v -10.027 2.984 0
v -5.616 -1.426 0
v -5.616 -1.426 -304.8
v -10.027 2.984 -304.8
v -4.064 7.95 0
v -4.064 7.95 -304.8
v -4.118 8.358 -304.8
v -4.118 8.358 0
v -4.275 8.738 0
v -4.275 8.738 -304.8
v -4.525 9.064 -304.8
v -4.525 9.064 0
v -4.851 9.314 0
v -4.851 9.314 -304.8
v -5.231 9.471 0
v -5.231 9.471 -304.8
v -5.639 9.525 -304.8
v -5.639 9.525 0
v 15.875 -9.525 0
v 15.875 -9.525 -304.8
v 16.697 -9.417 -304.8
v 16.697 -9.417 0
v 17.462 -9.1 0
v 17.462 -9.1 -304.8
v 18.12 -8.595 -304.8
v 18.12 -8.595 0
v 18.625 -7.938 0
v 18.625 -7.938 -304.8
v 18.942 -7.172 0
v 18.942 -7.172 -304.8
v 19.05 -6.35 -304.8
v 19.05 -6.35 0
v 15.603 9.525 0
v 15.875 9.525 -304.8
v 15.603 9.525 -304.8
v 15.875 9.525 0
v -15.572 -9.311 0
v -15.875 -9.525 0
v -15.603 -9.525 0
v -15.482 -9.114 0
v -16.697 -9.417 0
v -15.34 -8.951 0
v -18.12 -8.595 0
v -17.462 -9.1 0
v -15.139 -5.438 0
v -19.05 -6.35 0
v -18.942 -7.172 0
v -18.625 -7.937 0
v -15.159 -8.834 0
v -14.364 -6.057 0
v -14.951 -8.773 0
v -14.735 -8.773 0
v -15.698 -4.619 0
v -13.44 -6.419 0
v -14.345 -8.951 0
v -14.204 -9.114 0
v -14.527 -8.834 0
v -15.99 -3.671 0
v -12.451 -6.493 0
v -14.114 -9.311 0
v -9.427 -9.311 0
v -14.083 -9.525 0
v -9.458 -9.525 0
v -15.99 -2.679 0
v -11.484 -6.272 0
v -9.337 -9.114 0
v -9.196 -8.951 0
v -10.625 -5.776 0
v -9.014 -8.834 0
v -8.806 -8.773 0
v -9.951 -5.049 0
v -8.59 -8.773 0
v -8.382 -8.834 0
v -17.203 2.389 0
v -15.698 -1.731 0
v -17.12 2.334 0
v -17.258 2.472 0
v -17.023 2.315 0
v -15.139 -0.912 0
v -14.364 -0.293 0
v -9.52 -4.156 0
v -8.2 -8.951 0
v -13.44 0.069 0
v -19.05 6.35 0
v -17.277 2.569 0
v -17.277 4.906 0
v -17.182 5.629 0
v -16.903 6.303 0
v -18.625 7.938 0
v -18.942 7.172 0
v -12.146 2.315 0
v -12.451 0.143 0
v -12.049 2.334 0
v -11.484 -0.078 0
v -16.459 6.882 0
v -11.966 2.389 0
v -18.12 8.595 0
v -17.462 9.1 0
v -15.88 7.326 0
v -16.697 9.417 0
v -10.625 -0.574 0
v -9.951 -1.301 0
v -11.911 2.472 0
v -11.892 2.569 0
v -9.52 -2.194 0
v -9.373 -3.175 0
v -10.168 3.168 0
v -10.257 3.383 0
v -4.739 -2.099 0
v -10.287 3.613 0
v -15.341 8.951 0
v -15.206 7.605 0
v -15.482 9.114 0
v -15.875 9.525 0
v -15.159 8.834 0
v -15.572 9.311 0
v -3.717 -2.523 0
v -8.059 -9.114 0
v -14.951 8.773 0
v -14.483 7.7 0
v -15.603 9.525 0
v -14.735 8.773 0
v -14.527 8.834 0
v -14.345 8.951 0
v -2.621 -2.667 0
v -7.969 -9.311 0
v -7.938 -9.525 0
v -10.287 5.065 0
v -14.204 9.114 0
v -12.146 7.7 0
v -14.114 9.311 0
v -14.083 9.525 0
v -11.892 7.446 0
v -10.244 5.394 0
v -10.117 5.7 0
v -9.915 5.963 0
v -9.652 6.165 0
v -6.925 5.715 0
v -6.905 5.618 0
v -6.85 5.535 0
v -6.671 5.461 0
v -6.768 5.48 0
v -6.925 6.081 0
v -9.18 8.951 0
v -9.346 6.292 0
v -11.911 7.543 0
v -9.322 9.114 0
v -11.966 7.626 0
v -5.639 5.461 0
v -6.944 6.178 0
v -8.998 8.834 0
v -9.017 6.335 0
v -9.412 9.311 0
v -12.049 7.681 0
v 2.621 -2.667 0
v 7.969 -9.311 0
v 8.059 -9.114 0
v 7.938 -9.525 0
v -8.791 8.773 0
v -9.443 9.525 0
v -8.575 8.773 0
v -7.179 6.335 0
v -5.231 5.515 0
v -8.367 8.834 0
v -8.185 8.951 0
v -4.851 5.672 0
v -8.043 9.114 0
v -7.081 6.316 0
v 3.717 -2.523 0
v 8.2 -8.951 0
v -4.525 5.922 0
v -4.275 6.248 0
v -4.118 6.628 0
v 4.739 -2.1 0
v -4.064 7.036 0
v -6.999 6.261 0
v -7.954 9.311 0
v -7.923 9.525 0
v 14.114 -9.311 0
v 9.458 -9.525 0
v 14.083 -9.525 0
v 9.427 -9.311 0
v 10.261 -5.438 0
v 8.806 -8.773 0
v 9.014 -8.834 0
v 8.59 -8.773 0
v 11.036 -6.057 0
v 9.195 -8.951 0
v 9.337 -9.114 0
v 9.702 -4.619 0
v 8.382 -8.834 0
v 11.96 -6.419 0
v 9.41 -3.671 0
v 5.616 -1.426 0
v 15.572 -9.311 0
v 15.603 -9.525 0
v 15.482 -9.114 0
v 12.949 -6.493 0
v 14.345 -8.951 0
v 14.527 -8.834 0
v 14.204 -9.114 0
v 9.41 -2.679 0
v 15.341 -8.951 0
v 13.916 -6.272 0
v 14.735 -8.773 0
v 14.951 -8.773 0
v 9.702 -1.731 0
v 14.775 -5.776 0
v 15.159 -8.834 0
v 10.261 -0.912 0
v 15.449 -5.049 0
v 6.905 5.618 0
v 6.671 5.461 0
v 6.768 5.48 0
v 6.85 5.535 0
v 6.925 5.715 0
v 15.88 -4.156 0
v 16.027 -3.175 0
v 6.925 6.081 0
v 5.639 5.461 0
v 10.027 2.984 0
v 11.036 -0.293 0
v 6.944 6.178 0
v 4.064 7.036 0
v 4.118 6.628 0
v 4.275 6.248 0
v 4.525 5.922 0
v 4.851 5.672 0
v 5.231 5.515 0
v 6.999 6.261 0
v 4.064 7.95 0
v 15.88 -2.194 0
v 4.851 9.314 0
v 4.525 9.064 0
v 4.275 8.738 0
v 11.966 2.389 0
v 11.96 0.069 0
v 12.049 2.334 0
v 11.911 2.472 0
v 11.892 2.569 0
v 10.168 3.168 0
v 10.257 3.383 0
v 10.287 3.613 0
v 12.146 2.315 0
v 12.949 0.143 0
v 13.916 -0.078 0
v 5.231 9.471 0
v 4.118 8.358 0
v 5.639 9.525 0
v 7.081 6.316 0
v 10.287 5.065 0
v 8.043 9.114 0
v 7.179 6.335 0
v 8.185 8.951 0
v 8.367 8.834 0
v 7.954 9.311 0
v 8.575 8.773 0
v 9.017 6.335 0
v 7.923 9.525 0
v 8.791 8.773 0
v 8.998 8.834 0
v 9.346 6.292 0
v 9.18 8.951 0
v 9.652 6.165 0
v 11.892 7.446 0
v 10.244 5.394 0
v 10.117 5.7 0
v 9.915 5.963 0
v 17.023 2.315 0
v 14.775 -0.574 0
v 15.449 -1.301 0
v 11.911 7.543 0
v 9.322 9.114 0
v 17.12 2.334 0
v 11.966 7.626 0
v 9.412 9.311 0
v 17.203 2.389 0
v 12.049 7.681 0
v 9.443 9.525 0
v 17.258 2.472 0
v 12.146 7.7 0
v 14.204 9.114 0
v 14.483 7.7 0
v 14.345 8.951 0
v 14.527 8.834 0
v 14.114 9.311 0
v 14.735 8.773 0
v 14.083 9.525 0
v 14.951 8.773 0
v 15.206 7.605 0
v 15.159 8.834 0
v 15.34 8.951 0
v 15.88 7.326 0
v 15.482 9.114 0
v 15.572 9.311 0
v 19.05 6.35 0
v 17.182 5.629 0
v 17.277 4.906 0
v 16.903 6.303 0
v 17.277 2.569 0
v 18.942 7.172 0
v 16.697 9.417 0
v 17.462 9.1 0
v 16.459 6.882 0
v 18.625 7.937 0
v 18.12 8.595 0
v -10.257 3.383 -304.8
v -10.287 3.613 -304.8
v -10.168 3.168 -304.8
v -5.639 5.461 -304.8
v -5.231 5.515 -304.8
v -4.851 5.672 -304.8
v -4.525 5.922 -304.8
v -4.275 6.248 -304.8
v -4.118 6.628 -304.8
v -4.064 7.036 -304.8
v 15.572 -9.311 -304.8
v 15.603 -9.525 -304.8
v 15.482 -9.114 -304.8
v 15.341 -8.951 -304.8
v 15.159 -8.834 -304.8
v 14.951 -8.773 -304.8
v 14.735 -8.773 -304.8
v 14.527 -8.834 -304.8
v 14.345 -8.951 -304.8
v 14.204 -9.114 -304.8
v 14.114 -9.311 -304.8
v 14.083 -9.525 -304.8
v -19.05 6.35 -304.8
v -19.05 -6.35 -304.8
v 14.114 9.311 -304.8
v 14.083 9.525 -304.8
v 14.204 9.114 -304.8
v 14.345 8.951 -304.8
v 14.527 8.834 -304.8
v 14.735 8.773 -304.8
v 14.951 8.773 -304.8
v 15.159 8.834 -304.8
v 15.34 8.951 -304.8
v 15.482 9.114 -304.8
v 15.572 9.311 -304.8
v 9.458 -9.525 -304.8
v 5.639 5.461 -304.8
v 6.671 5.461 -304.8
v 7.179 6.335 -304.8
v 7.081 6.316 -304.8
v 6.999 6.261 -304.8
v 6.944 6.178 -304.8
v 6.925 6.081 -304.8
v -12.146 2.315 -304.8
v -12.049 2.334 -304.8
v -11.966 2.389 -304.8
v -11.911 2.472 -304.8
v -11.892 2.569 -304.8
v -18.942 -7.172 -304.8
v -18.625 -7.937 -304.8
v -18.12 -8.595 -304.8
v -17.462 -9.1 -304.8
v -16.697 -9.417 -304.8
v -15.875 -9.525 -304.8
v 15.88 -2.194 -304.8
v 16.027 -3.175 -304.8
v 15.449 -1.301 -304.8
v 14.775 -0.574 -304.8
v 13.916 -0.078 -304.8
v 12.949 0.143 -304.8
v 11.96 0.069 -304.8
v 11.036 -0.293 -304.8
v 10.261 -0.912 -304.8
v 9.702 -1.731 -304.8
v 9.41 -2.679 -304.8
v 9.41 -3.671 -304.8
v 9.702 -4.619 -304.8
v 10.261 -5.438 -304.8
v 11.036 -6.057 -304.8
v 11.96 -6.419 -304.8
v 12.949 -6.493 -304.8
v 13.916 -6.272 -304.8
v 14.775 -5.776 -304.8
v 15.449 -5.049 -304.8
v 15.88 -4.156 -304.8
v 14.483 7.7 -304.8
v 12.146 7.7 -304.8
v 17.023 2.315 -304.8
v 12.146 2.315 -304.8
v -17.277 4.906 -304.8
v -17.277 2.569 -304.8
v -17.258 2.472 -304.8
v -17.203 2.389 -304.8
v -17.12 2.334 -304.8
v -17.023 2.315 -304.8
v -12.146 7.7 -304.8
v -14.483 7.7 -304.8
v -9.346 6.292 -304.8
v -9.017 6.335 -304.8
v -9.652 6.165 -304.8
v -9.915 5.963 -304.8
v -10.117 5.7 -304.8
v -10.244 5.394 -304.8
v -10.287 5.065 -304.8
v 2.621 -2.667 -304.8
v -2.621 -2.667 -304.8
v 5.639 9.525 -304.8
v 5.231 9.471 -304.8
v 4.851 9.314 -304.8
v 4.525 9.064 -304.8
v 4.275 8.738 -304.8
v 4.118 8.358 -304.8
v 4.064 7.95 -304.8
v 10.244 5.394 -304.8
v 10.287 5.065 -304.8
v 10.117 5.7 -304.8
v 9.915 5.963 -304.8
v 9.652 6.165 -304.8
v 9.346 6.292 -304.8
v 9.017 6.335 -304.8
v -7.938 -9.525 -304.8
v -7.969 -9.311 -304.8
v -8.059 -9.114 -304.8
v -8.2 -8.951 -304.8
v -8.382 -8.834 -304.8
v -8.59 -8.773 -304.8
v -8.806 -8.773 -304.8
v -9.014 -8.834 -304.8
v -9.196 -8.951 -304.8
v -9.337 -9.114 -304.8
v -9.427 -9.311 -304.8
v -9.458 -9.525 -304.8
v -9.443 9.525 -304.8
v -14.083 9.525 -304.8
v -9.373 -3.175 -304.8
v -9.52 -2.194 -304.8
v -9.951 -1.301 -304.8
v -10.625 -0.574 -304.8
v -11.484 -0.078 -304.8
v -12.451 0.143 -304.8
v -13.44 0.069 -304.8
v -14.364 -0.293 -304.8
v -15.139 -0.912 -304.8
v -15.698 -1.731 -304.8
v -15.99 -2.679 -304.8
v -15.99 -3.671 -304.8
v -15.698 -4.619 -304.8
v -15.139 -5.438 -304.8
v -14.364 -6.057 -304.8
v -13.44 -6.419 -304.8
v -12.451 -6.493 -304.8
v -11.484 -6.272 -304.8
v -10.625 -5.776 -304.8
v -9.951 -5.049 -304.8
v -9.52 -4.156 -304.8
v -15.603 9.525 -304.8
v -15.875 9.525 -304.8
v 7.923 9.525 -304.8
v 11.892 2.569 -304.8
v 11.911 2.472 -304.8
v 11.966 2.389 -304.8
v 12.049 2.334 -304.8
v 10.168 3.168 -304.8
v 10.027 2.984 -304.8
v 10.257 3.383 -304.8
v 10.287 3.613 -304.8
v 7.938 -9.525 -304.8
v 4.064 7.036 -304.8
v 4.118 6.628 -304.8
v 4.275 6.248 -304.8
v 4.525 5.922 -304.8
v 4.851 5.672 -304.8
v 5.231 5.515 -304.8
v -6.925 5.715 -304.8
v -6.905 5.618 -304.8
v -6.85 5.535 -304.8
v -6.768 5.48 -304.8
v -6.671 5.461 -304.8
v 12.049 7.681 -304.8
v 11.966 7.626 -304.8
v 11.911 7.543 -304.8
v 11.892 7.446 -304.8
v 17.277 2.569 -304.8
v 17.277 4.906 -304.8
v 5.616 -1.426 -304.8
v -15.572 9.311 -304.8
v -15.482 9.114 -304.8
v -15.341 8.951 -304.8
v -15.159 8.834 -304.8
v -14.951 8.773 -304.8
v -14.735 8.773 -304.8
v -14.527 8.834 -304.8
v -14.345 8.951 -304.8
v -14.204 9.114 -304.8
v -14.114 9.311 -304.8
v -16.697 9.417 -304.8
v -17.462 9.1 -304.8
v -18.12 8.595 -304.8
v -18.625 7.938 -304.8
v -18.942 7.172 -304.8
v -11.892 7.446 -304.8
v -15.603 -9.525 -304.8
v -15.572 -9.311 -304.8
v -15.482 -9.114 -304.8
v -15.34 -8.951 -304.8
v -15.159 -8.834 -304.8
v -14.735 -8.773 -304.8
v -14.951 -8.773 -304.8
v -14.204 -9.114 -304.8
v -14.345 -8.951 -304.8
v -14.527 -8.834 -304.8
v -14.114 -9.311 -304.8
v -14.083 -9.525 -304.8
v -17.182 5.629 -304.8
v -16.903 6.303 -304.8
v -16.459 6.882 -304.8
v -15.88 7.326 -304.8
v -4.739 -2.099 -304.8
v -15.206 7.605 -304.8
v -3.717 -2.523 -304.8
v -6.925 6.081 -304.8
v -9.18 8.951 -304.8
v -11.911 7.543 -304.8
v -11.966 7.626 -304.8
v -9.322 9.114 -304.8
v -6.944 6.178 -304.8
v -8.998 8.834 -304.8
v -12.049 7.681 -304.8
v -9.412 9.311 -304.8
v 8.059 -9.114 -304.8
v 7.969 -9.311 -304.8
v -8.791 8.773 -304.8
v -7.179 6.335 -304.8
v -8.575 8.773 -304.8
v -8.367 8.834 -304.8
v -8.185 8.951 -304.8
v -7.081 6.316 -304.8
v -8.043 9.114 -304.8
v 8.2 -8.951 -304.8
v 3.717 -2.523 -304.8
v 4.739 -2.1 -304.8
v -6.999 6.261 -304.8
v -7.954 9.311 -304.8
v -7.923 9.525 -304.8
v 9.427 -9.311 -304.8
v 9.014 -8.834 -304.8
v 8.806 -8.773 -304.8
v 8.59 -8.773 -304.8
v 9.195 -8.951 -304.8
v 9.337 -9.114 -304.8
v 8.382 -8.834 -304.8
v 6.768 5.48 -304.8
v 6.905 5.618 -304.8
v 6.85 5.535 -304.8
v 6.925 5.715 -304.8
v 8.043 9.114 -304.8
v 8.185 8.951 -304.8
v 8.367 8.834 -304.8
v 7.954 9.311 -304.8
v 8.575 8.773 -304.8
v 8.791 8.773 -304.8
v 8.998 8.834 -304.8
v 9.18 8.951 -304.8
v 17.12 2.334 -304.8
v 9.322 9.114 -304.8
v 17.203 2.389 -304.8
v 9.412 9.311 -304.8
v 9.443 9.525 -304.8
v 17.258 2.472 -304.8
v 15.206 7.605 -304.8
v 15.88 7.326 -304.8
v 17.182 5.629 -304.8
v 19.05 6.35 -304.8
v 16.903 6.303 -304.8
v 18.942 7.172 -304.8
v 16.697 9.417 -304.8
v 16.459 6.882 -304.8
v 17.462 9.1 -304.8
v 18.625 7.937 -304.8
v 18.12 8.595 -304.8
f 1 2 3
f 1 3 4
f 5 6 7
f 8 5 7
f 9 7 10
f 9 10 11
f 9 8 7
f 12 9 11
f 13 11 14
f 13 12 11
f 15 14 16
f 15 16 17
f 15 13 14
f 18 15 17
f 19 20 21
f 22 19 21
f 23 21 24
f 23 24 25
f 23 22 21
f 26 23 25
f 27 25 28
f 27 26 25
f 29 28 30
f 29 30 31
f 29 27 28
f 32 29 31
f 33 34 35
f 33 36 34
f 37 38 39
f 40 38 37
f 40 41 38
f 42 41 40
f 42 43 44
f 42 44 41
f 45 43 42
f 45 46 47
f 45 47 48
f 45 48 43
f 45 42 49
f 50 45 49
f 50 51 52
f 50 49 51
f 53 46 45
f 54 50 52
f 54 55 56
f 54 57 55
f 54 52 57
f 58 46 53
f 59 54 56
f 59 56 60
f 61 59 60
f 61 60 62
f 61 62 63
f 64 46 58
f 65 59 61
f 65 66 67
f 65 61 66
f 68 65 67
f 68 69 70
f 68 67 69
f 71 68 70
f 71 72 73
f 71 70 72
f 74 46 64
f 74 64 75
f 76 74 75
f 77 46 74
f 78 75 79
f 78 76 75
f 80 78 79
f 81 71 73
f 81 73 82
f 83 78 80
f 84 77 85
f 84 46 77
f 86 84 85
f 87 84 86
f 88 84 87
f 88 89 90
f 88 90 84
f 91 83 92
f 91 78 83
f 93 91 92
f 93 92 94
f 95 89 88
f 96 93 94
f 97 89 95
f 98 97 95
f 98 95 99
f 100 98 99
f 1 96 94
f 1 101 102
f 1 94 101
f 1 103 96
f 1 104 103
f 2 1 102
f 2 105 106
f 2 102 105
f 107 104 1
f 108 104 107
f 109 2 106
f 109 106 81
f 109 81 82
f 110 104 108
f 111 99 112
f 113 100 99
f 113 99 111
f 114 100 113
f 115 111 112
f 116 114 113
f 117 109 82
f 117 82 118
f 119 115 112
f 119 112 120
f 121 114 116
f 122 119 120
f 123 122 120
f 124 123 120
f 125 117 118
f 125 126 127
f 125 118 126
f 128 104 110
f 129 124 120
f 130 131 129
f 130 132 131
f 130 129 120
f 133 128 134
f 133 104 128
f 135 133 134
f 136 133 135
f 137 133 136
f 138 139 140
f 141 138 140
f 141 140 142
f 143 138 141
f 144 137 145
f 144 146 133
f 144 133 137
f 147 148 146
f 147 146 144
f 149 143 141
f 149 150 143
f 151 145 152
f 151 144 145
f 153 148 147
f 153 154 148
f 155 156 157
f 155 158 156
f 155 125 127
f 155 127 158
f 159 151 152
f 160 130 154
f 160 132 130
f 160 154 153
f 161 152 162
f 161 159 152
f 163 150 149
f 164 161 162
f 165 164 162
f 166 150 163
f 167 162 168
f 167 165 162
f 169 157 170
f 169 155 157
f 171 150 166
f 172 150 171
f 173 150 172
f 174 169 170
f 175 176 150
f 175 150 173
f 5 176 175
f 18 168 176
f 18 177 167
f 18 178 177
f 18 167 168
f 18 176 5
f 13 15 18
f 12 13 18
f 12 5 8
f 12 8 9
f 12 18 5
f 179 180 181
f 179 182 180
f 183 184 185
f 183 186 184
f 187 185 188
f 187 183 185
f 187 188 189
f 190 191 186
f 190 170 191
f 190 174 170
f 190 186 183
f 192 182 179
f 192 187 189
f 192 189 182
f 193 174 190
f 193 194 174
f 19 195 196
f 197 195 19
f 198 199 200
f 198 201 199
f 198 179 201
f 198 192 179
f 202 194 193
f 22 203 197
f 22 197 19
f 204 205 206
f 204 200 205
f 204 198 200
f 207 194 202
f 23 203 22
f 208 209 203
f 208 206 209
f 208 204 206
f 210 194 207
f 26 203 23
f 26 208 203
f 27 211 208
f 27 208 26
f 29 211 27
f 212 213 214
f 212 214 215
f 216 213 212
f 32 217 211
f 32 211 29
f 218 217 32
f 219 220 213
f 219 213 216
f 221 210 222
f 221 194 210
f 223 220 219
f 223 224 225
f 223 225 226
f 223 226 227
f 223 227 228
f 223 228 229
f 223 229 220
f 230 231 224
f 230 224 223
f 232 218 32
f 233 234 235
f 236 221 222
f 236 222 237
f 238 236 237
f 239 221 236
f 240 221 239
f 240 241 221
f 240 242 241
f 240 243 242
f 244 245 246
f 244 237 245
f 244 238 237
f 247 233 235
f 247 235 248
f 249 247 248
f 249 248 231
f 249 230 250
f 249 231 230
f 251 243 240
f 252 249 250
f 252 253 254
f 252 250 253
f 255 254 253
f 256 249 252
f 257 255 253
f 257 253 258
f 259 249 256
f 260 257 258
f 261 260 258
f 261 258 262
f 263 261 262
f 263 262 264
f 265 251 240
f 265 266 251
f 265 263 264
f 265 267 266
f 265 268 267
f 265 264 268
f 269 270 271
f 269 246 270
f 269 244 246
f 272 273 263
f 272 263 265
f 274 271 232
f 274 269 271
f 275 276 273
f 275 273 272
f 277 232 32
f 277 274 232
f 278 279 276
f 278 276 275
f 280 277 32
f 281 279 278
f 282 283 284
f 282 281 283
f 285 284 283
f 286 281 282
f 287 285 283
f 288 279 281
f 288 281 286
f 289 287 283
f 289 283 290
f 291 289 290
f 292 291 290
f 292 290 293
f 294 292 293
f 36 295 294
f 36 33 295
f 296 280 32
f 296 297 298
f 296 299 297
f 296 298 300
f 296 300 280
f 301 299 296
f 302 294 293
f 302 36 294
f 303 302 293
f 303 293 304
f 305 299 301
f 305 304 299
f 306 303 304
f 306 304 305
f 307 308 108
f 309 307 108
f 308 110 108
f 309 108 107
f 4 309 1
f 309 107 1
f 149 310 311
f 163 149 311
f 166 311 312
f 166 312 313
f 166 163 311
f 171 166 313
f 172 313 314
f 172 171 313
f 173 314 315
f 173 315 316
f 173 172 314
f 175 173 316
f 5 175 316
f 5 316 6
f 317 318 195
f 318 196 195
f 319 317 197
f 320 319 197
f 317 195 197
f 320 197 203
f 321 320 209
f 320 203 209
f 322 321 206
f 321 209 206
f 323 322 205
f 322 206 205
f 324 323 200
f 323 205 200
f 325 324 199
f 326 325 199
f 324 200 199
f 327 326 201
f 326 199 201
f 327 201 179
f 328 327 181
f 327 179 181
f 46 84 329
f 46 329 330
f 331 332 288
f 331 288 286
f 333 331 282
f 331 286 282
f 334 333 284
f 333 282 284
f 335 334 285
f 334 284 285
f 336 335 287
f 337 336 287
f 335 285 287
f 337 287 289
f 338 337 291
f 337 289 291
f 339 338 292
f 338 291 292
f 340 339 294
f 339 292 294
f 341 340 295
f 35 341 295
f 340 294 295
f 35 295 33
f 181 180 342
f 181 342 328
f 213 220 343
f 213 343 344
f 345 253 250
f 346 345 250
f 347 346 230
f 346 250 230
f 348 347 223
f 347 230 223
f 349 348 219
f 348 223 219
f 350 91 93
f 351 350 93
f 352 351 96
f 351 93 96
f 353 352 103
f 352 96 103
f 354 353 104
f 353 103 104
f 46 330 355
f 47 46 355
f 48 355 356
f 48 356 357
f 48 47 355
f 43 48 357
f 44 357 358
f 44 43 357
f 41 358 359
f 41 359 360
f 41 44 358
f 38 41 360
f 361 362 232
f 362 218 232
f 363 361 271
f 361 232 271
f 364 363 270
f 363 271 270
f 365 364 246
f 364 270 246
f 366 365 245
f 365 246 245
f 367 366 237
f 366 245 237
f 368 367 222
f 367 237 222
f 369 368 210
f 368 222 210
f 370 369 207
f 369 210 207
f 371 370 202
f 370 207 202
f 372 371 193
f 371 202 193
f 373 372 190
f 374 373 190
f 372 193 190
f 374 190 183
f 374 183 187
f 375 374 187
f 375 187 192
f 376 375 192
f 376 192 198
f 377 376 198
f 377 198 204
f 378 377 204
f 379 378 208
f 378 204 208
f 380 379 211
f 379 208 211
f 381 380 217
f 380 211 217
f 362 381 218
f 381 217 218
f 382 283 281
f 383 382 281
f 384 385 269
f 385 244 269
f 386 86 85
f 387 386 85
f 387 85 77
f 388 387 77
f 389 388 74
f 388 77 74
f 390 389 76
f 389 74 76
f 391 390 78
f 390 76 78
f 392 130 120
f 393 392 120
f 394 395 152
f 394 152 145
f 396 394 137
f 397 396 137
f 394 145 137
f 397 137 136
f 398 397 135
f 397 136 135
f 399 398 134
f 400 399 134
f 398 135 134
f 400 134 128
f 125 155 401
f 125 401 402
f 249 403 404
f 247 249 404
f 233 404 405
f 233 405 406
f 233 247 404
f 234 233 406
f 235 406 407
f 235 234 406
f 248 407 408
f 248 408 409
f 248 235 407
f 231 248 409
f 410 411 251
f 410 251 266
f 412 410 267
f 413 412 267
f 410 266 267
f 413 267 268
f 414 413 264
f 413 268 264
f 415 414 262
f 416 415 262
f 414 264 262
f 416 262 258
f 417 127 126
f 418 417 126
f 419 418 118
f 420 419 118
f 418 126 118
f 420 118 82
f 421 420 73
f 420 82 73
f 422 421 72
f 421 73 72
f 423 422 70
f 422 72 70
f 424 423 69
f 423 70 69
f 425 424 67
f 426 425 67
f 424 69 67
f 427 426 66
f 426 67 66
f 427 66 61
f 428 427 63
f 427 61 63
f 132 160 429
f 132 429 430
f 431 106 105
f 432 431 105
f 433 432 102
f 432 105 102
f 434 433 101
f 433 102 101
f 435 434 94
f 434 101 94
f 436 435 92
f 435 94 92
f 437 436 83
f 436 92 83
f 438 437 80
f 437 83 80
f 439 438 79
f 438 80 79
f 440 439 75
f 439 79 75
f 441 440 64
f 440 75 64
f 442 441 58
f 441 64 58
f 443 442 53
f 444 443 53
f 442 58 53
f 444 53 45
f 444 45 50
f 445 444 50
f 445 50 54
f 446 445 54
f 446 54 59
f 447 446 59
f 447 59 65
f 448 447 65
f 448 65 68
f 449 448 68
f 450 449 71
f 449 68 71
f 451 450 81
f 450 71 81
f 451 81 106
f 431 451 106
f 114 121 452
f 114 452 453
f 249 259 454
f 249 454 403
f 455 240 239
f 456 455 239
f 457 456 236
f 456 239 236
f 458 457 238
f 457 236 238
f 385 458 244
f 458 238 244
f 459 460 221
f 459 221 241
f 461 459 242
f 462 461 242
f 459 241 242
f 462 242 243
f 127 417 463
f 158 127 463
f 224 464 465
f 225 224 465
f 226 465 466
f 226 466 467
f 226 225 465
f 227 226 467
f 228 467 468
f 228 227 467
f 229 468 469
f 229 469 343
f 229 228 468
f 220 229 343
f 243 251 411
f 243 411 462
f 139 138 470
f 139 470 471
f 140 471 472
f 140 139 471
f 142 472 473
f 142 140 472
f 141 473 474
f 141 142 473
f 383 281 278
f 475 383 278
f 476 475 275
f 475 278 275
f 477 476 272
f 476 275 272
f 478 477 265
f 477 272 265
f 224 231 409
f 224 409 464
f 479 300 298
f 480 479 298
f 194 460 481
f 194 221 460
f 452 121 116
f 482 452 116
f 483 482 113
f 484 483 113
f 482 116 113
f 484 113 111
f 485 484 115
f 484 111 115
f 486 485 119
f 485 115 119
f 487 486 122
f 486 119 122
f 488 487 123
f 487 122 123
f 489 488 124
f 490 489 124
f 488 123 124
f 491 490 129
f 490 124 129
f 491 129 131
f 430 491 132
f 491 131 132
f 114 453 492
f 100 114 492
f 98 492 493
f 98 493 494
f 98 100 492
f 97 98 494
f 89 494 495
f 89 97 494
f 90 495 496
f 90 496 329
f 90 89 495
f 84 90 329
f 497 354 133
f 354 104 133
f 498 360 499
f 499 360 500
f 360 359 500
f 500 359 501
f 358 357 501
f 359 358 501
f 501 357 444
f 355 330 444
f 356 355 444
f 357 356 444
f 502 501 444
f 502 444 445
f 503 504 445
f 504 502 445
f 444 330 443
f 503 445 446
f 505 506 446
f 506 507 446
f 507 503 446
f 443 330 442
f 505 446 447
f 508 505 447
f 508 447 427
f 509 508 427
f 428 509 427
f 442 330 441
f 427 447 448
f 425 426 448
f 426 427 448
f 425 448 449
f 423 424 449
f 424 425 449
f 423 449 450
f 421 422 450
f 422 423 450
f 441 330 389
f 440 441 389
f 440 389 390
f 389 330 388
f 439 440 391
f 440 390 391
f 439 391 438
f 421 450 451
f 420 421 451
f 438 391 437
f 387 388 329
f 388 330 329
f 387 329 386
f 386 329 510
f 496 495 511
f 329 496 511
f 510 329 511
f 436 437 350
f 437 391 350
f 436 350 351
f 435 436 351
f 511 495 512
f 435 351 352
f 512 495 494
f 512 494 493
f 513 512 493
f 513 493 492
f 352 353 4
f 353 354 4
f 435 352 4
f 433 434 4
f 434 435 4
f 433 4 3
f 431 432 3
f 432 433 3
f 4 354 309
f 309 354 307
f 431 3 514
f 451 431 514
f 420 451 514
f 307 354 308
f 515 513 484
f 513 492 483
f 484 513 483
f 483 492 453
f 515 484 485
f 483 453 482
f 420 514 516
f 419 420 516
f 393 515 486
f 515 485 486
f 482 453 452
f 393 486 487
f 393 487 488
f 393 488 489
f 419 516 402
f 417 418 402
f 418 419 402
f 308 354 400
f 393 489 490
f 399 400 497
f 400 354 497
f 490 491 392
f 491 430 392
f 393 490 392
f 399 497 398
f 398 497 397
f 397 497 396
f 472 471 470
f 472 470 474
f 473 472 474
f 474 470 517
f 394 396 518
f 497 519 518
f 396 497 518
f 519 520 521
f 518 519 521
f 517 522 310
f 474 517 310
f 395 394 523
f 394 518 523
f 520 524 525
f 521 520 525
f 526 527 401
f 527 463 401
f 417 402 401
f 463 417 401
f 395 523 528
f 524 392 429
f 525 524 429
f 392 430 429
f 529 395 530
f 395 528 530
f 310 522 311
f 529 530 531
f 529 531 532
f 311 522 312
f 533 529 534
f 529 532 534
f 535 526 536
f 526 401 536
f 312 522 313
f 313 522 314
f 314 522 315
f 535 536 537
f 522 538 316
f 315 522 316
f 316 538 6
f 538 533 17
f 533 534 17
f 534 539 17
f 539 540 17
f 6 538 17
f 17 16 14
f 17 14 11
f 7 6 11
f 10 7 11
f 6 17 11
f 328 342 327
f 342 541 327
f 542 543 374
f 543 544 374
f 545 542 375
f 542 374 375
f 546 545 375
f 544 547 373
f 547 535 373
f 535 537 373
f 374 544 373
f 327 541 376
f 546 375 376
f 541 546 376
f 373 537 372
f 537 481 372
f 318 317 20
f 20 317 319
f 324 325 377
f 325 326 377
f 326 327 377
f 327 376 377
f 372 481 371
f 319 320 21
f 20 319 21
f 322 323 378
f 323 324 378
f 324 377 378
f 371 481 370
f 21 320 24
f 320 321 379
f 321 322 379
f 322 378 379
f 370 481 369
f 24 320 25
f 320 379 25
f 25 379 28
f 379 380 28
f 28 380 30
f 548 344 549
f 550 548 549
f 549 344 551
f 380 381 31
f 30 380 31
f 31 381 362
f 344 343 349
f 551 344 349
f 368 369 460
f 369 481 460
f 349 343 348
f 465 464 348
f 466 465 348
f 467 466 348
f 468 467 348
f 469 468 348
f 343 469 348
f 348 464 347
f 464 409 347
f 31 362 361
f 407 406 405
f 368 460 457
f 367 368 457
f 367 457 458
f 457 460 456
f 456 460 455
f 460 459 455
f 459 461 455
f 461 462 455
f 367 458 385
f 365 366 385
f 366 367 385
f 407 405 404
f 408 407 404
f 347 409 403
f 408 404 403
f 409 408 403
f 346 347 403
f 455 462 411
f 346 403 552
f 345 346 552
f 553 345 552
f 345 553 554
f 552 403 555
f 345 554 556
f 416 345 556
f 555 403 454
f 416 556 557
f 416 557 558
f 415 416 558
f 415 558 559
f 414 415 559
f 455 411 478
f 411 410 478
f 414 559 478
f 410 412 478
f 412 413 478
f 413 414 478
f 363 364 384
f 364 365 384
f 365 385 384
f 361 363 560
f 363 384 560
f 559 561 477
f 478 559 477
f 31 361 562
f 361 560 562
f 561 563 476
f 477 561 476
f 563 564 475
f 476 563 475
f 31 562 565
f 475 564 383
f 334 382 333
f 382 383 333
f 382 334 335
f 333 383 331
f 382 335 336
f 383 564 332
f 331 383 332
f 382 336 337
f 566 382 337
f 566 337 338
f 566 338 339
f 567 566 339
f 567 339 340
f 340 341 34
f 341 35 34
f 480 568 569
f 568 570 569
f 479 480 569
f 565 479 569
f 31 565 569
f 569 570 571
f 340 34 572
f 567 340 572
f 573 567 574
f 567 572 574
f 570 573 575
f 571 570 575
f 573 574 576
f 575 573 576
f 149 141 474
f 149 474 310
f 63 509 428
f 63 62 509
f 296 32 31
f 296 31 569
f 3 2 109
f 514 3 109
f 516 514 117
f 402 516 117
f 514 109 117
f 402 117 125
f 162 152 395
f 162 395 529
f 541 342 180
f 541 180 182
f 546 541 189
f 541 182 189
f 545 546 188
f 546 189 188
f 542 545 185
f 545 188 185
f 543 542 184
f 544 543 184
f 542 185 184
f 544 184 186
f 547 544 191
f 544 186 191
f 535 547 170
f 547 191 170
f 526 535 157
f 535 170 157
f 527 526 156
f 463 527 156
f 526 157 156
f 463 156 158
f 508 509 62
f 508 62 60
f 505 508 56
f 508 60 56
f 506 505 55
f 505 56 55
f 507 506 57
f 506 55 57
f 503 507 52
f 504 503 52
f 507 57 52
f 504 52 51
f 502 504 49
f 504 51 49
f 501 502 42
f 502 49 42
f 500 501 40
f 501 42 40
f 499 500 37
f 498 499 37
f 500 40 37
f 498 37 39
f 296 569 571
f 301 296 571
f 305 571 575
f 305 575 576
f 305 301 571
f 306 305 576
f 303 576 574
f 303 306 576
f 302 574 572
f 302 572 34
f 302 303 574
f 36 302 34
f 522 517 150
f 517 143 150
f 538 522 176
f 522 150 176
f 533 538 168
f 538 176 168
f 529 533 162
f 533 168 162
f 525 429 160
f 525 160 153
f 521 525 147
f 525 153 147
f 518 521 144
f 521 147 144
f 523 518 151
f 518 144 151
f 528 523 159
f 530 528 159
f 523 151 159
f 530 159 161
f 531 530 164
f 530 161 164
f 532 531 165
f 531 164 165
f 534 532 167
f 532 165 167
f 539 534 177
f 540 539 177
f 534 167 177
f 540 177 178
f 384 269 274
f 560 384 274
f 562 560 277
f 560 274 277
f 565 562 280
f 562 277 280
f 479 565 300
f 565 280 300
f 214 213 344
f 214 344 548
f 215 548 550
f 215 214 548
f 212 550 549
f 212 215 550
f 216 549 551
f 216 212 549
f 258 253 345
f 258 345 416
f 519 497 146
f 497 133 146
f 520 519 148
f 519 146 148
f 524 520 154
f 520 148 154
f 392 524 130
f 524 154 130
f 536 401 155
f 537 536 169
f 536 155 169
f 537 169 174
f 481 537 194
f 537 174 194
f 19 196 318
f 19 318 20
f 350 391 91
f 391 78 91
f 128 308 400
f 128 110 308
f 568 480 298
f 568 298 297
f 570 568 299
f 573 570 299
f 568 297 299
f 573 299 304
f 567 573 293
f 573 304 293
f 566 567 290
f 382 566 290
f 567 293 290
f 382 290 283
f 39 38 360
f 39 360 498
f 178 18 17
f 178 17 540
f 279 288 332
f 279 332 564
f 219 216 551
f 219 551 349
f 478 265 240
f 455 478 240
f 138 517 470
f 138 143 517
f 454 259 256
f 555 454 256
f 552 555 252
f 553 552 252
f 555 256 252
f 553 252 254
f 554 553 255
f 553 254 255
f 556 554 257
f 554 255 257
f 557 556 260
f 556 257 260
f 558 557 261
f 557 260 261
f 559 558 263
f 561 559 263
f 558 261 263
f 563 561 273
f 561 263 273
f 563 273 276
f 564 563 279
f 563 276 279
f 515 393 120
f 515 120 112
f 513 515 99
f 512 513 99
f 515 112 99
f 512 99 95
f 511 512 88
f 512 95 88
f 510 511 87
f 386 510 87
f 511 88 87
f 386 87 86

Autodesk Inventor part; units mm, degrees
ref_plane "YZ Plane" through (0, 0, 0) normal (1, 0, 0) x (0, 1, 0)
ref_plane "XZ Plane" through (0, 0, 0) normal (0, 1, 0) x (-1, 0, 0)
ref_plane "XY Plane" through (0, 0, 0) normal (0, 0, 1) x (1, 0, 0)
sketch "Sketch1" plane through (0, 0, 0) normal (0, 0, 1) x (1, 0, 0)
  circle A0 centre (12.7, -3.175) radius 3.3274
  arc A1 (-12.1461, 2.3151) -> (-11.8921, 2.5691) centre (-12.1461, 2.5691) ccw
  line L0 (-17.0229, 2.3151) -> (-12.1461, 2.3151)
  arc A2 (-17.2769, 2.5691) -> (-17.0229, 2.3151) centre (-17.0229, 2.5691) ccw
  line L1 (-17.2769, 4.9059) -> (-17.2769, 2.5691)
  arc A3 (-14.4829, 7.6999) -> (-17.2769, 4.9059) centre (-14.4829, 4.9059) ccw
  line L2 (-12.1461, 7.6999) -> (-14.4829, 7.6999)
  arc A4 (-11.8921, 7.4459) -> (-12.1461, 7.6999) centre (-12.1461, 7.4459) ccw
  line L3 (-11.8921, 2.5691) -> (-11.8921, 7.4459)
  circle A5 centre (-12.7, -3.175) radius 3.3274
  arc A6 (12.1461, 7.6999) -> (11.8921, 7.4459) centre (12.1461, 7.4459) ccw
  line L4 (14.4829, 7.6999) -> (12.1461, 7.6999)
  arc A7 (17.2769, 4.9059) -> (14.4829, 7.6999) centre (14.4829, 4.9059) ccw
  line L5 (17.2769, 2.5691) -> (17.2769, 4.9059)
  arc A8 (17.0229, 2.3151) -> (17.2769, 2.5691) centre (17.0229, 2.5691) ccw
  line L6 (12.1461, 2.3151) -> (17.0229, 2.3151)
  arc A9 (11.8921, 2.5691) -> (12.1461, 2.3151) centre (12.1461, 2.5691) ccw
  line L7 (11.8921, 7.4459) -> (11.8921, 2.5691)
  line L8 (-9.4427, 9.525) -> (-14.0829, 9.525)
  arc A10 (-15.6028, 9.525) -> (-14.0829, 9.525) centre (-14.8428, 9.525) ccw
  line L9 (-15.6028, 9.525) -> (-15.875, 9.525)
  arc A11 (-15.875, 9.525) -> (-19.05, 6.35) centre (-15.875, 6.35) ccw
  line L10 (-19.05, 6.35) -> (-19.05, -6.35)
  arc A12 (-19.05, -6.35) -> (-15.875, -9.525) centre (-15.875, -6.35) ccw
  line L11 (-15.875, -9.525) -> (-15.6028, -9.525)
  arc A13 (-14.0829, -9.525) -> (-15.6028, -9.525) centre (-14.8428, -9.525) ccw
  line L12 (-14.0829, -9.525) -> (-9.4578, -9.525)
  arc A14 (-7.9379, -9.525) -> (-9.4578, -9.525) centre (-8.6979, -9.525) ccw
  line L13 (-7.9379, -9.525) -> (7.9379, -9.525)
  arc A15 (9.4578, -9.525) -> (7.9379, -9.525) centre (8.6979, -9.525) ccw
  line L14 (9.4578, -9.525) -> (14.0829, -9.525)
  arc A16 (15.6028, -9.525) -> (14.0829, -9.525) centre (14.8428, -9.525) ccw
  line L15 (15.6028, -9.525) -> (15.875, -9.525)
  arc A17 (15.875, -9.525) -> (19.05, -6.35) centre (15.875, -6.35) ccw
  line L16 (19.05, -6.35) -> (19.05, 6.35)
  arc A18 (19.05, 6.35) -> (15.875, 9.525) centre (15.875, 6.35) ccw
  line L17 (15.875, 9.525) -> (15.6028, 9.525)
  arc A19 (14.0829, 9.525) -> (15.6028, 9.525) centre (14.8428, 9.525) ccw
  line L18 (14.0829, 9.525) -> (9.4427, 9.525)
  arc A20 (7.9228, 9.525) -> (9.4427, 9.525) centre (8.6828, 9.525) ccw
  line L19 (7.9228, 9.525) -> (5.6388, 9.525)
  arc A21 (5.6388, 9.525) -> (4.064, 7.9502) centre (5.6388, 7.9502) ccw
  line L20 (4.064, 7.9502) -> (4.064, 7.0358)
  arc A22 (4.064, 7.0358) -> (5.6388, 5.461) centre (5.6388, 7.0358) ccw
  line L21 (5.6388, 5.461) -> (6.6706, 5.461)
  arc A23 (6.6706, 5.461) -> (6.9246, 5.715) centre (6.6706, 5.715) ccw
  line L22 (6.9246, 5.715) -> (6.9246, 6.081)
  arc A24 (7.1786, 6.335) -> (6.9246, 6.081) centre (7.1786, 6.081) ccw
  line L23 (7.1786, 6.335) -> (9.017, 6.335)
  arc A25 (10.287, 5.065) -> (9.017, 6.335) centre (9.017, 5.065) ccw
  line L24 (10.287, 5.065) -> (10.287, 3.6128)
  arc A26 (10.0266, 2.9842) -> (10.287, 3.6128) centre (9.398, 3.6128) ccw
  line L25 (10.0266, 2.9842) -> (5.6159, -1.4264)
  arc A27 (2.621, -2.667) -> (5.6159, -1.4264) centre (2.621, 1.5686) ccw
  line L26 (2.621, -2.667) -> (-2.621, -2.667)
  arc A28 (-5.6159, -1.4264) -> (-2.621, -2.667) centre (-2.621, 1.5686) ccw
  line L27 (-5.6159, -1.4264) -> (-10.0266, 2.9842)
  arc A29 (-10.287, 3.6128) -> (-10.0266, 2.9842) centre (-9.398, 3.6128) ccw
  line L28 (-10.287, 3.6128) -> (-10.287, 5.065)
  arc A30 (-9.017, 6.335) -> (-10.287, 5.065) centre (-9.017, 5.065) ccw
  line L29 (-9.017, 6.335) -> (-7.1786, 6.335)
  arc A31 (-6.9246, 6.081) -> (-7.1786, 6.335) centre (-7.1786, 6.081) ccw
  line L30 (-6.9246, 6.081) -> (-6.9246, 5.715)
  arc A32 (-6.9246, 5.715) -> (-6.6706, 5.461) centre (-6.6706, 5.715) ccw
  line L31 (-6.6706, 5.461) -> (-5.6388, 5.461)
  arc A33 (-5.6388, 5.461) -> (-4.064, 7.0358) centre (-5.6388, 7.0358) ccw
  line L32 (-4.064, 7.0358) -> (-4.064, 7.9502)
  arc A34 (-4.064, 7.9502) -> (-5.6388, 9.525) centre (-5.6388, 7.9502) ccw
  line L33 (-5.6388, 9.525) -> (-7.9228, 9.525)
  arc A35 (-9.4427, 9.525) -> (-7.9228, 9.525) centre (-8.6828, 9.525) ccw
  point P0 (0, 0)
extrude "Extrusion1" add sketch "Sketch1" against normal blind 304.8
properties part number "1534-LITE"
